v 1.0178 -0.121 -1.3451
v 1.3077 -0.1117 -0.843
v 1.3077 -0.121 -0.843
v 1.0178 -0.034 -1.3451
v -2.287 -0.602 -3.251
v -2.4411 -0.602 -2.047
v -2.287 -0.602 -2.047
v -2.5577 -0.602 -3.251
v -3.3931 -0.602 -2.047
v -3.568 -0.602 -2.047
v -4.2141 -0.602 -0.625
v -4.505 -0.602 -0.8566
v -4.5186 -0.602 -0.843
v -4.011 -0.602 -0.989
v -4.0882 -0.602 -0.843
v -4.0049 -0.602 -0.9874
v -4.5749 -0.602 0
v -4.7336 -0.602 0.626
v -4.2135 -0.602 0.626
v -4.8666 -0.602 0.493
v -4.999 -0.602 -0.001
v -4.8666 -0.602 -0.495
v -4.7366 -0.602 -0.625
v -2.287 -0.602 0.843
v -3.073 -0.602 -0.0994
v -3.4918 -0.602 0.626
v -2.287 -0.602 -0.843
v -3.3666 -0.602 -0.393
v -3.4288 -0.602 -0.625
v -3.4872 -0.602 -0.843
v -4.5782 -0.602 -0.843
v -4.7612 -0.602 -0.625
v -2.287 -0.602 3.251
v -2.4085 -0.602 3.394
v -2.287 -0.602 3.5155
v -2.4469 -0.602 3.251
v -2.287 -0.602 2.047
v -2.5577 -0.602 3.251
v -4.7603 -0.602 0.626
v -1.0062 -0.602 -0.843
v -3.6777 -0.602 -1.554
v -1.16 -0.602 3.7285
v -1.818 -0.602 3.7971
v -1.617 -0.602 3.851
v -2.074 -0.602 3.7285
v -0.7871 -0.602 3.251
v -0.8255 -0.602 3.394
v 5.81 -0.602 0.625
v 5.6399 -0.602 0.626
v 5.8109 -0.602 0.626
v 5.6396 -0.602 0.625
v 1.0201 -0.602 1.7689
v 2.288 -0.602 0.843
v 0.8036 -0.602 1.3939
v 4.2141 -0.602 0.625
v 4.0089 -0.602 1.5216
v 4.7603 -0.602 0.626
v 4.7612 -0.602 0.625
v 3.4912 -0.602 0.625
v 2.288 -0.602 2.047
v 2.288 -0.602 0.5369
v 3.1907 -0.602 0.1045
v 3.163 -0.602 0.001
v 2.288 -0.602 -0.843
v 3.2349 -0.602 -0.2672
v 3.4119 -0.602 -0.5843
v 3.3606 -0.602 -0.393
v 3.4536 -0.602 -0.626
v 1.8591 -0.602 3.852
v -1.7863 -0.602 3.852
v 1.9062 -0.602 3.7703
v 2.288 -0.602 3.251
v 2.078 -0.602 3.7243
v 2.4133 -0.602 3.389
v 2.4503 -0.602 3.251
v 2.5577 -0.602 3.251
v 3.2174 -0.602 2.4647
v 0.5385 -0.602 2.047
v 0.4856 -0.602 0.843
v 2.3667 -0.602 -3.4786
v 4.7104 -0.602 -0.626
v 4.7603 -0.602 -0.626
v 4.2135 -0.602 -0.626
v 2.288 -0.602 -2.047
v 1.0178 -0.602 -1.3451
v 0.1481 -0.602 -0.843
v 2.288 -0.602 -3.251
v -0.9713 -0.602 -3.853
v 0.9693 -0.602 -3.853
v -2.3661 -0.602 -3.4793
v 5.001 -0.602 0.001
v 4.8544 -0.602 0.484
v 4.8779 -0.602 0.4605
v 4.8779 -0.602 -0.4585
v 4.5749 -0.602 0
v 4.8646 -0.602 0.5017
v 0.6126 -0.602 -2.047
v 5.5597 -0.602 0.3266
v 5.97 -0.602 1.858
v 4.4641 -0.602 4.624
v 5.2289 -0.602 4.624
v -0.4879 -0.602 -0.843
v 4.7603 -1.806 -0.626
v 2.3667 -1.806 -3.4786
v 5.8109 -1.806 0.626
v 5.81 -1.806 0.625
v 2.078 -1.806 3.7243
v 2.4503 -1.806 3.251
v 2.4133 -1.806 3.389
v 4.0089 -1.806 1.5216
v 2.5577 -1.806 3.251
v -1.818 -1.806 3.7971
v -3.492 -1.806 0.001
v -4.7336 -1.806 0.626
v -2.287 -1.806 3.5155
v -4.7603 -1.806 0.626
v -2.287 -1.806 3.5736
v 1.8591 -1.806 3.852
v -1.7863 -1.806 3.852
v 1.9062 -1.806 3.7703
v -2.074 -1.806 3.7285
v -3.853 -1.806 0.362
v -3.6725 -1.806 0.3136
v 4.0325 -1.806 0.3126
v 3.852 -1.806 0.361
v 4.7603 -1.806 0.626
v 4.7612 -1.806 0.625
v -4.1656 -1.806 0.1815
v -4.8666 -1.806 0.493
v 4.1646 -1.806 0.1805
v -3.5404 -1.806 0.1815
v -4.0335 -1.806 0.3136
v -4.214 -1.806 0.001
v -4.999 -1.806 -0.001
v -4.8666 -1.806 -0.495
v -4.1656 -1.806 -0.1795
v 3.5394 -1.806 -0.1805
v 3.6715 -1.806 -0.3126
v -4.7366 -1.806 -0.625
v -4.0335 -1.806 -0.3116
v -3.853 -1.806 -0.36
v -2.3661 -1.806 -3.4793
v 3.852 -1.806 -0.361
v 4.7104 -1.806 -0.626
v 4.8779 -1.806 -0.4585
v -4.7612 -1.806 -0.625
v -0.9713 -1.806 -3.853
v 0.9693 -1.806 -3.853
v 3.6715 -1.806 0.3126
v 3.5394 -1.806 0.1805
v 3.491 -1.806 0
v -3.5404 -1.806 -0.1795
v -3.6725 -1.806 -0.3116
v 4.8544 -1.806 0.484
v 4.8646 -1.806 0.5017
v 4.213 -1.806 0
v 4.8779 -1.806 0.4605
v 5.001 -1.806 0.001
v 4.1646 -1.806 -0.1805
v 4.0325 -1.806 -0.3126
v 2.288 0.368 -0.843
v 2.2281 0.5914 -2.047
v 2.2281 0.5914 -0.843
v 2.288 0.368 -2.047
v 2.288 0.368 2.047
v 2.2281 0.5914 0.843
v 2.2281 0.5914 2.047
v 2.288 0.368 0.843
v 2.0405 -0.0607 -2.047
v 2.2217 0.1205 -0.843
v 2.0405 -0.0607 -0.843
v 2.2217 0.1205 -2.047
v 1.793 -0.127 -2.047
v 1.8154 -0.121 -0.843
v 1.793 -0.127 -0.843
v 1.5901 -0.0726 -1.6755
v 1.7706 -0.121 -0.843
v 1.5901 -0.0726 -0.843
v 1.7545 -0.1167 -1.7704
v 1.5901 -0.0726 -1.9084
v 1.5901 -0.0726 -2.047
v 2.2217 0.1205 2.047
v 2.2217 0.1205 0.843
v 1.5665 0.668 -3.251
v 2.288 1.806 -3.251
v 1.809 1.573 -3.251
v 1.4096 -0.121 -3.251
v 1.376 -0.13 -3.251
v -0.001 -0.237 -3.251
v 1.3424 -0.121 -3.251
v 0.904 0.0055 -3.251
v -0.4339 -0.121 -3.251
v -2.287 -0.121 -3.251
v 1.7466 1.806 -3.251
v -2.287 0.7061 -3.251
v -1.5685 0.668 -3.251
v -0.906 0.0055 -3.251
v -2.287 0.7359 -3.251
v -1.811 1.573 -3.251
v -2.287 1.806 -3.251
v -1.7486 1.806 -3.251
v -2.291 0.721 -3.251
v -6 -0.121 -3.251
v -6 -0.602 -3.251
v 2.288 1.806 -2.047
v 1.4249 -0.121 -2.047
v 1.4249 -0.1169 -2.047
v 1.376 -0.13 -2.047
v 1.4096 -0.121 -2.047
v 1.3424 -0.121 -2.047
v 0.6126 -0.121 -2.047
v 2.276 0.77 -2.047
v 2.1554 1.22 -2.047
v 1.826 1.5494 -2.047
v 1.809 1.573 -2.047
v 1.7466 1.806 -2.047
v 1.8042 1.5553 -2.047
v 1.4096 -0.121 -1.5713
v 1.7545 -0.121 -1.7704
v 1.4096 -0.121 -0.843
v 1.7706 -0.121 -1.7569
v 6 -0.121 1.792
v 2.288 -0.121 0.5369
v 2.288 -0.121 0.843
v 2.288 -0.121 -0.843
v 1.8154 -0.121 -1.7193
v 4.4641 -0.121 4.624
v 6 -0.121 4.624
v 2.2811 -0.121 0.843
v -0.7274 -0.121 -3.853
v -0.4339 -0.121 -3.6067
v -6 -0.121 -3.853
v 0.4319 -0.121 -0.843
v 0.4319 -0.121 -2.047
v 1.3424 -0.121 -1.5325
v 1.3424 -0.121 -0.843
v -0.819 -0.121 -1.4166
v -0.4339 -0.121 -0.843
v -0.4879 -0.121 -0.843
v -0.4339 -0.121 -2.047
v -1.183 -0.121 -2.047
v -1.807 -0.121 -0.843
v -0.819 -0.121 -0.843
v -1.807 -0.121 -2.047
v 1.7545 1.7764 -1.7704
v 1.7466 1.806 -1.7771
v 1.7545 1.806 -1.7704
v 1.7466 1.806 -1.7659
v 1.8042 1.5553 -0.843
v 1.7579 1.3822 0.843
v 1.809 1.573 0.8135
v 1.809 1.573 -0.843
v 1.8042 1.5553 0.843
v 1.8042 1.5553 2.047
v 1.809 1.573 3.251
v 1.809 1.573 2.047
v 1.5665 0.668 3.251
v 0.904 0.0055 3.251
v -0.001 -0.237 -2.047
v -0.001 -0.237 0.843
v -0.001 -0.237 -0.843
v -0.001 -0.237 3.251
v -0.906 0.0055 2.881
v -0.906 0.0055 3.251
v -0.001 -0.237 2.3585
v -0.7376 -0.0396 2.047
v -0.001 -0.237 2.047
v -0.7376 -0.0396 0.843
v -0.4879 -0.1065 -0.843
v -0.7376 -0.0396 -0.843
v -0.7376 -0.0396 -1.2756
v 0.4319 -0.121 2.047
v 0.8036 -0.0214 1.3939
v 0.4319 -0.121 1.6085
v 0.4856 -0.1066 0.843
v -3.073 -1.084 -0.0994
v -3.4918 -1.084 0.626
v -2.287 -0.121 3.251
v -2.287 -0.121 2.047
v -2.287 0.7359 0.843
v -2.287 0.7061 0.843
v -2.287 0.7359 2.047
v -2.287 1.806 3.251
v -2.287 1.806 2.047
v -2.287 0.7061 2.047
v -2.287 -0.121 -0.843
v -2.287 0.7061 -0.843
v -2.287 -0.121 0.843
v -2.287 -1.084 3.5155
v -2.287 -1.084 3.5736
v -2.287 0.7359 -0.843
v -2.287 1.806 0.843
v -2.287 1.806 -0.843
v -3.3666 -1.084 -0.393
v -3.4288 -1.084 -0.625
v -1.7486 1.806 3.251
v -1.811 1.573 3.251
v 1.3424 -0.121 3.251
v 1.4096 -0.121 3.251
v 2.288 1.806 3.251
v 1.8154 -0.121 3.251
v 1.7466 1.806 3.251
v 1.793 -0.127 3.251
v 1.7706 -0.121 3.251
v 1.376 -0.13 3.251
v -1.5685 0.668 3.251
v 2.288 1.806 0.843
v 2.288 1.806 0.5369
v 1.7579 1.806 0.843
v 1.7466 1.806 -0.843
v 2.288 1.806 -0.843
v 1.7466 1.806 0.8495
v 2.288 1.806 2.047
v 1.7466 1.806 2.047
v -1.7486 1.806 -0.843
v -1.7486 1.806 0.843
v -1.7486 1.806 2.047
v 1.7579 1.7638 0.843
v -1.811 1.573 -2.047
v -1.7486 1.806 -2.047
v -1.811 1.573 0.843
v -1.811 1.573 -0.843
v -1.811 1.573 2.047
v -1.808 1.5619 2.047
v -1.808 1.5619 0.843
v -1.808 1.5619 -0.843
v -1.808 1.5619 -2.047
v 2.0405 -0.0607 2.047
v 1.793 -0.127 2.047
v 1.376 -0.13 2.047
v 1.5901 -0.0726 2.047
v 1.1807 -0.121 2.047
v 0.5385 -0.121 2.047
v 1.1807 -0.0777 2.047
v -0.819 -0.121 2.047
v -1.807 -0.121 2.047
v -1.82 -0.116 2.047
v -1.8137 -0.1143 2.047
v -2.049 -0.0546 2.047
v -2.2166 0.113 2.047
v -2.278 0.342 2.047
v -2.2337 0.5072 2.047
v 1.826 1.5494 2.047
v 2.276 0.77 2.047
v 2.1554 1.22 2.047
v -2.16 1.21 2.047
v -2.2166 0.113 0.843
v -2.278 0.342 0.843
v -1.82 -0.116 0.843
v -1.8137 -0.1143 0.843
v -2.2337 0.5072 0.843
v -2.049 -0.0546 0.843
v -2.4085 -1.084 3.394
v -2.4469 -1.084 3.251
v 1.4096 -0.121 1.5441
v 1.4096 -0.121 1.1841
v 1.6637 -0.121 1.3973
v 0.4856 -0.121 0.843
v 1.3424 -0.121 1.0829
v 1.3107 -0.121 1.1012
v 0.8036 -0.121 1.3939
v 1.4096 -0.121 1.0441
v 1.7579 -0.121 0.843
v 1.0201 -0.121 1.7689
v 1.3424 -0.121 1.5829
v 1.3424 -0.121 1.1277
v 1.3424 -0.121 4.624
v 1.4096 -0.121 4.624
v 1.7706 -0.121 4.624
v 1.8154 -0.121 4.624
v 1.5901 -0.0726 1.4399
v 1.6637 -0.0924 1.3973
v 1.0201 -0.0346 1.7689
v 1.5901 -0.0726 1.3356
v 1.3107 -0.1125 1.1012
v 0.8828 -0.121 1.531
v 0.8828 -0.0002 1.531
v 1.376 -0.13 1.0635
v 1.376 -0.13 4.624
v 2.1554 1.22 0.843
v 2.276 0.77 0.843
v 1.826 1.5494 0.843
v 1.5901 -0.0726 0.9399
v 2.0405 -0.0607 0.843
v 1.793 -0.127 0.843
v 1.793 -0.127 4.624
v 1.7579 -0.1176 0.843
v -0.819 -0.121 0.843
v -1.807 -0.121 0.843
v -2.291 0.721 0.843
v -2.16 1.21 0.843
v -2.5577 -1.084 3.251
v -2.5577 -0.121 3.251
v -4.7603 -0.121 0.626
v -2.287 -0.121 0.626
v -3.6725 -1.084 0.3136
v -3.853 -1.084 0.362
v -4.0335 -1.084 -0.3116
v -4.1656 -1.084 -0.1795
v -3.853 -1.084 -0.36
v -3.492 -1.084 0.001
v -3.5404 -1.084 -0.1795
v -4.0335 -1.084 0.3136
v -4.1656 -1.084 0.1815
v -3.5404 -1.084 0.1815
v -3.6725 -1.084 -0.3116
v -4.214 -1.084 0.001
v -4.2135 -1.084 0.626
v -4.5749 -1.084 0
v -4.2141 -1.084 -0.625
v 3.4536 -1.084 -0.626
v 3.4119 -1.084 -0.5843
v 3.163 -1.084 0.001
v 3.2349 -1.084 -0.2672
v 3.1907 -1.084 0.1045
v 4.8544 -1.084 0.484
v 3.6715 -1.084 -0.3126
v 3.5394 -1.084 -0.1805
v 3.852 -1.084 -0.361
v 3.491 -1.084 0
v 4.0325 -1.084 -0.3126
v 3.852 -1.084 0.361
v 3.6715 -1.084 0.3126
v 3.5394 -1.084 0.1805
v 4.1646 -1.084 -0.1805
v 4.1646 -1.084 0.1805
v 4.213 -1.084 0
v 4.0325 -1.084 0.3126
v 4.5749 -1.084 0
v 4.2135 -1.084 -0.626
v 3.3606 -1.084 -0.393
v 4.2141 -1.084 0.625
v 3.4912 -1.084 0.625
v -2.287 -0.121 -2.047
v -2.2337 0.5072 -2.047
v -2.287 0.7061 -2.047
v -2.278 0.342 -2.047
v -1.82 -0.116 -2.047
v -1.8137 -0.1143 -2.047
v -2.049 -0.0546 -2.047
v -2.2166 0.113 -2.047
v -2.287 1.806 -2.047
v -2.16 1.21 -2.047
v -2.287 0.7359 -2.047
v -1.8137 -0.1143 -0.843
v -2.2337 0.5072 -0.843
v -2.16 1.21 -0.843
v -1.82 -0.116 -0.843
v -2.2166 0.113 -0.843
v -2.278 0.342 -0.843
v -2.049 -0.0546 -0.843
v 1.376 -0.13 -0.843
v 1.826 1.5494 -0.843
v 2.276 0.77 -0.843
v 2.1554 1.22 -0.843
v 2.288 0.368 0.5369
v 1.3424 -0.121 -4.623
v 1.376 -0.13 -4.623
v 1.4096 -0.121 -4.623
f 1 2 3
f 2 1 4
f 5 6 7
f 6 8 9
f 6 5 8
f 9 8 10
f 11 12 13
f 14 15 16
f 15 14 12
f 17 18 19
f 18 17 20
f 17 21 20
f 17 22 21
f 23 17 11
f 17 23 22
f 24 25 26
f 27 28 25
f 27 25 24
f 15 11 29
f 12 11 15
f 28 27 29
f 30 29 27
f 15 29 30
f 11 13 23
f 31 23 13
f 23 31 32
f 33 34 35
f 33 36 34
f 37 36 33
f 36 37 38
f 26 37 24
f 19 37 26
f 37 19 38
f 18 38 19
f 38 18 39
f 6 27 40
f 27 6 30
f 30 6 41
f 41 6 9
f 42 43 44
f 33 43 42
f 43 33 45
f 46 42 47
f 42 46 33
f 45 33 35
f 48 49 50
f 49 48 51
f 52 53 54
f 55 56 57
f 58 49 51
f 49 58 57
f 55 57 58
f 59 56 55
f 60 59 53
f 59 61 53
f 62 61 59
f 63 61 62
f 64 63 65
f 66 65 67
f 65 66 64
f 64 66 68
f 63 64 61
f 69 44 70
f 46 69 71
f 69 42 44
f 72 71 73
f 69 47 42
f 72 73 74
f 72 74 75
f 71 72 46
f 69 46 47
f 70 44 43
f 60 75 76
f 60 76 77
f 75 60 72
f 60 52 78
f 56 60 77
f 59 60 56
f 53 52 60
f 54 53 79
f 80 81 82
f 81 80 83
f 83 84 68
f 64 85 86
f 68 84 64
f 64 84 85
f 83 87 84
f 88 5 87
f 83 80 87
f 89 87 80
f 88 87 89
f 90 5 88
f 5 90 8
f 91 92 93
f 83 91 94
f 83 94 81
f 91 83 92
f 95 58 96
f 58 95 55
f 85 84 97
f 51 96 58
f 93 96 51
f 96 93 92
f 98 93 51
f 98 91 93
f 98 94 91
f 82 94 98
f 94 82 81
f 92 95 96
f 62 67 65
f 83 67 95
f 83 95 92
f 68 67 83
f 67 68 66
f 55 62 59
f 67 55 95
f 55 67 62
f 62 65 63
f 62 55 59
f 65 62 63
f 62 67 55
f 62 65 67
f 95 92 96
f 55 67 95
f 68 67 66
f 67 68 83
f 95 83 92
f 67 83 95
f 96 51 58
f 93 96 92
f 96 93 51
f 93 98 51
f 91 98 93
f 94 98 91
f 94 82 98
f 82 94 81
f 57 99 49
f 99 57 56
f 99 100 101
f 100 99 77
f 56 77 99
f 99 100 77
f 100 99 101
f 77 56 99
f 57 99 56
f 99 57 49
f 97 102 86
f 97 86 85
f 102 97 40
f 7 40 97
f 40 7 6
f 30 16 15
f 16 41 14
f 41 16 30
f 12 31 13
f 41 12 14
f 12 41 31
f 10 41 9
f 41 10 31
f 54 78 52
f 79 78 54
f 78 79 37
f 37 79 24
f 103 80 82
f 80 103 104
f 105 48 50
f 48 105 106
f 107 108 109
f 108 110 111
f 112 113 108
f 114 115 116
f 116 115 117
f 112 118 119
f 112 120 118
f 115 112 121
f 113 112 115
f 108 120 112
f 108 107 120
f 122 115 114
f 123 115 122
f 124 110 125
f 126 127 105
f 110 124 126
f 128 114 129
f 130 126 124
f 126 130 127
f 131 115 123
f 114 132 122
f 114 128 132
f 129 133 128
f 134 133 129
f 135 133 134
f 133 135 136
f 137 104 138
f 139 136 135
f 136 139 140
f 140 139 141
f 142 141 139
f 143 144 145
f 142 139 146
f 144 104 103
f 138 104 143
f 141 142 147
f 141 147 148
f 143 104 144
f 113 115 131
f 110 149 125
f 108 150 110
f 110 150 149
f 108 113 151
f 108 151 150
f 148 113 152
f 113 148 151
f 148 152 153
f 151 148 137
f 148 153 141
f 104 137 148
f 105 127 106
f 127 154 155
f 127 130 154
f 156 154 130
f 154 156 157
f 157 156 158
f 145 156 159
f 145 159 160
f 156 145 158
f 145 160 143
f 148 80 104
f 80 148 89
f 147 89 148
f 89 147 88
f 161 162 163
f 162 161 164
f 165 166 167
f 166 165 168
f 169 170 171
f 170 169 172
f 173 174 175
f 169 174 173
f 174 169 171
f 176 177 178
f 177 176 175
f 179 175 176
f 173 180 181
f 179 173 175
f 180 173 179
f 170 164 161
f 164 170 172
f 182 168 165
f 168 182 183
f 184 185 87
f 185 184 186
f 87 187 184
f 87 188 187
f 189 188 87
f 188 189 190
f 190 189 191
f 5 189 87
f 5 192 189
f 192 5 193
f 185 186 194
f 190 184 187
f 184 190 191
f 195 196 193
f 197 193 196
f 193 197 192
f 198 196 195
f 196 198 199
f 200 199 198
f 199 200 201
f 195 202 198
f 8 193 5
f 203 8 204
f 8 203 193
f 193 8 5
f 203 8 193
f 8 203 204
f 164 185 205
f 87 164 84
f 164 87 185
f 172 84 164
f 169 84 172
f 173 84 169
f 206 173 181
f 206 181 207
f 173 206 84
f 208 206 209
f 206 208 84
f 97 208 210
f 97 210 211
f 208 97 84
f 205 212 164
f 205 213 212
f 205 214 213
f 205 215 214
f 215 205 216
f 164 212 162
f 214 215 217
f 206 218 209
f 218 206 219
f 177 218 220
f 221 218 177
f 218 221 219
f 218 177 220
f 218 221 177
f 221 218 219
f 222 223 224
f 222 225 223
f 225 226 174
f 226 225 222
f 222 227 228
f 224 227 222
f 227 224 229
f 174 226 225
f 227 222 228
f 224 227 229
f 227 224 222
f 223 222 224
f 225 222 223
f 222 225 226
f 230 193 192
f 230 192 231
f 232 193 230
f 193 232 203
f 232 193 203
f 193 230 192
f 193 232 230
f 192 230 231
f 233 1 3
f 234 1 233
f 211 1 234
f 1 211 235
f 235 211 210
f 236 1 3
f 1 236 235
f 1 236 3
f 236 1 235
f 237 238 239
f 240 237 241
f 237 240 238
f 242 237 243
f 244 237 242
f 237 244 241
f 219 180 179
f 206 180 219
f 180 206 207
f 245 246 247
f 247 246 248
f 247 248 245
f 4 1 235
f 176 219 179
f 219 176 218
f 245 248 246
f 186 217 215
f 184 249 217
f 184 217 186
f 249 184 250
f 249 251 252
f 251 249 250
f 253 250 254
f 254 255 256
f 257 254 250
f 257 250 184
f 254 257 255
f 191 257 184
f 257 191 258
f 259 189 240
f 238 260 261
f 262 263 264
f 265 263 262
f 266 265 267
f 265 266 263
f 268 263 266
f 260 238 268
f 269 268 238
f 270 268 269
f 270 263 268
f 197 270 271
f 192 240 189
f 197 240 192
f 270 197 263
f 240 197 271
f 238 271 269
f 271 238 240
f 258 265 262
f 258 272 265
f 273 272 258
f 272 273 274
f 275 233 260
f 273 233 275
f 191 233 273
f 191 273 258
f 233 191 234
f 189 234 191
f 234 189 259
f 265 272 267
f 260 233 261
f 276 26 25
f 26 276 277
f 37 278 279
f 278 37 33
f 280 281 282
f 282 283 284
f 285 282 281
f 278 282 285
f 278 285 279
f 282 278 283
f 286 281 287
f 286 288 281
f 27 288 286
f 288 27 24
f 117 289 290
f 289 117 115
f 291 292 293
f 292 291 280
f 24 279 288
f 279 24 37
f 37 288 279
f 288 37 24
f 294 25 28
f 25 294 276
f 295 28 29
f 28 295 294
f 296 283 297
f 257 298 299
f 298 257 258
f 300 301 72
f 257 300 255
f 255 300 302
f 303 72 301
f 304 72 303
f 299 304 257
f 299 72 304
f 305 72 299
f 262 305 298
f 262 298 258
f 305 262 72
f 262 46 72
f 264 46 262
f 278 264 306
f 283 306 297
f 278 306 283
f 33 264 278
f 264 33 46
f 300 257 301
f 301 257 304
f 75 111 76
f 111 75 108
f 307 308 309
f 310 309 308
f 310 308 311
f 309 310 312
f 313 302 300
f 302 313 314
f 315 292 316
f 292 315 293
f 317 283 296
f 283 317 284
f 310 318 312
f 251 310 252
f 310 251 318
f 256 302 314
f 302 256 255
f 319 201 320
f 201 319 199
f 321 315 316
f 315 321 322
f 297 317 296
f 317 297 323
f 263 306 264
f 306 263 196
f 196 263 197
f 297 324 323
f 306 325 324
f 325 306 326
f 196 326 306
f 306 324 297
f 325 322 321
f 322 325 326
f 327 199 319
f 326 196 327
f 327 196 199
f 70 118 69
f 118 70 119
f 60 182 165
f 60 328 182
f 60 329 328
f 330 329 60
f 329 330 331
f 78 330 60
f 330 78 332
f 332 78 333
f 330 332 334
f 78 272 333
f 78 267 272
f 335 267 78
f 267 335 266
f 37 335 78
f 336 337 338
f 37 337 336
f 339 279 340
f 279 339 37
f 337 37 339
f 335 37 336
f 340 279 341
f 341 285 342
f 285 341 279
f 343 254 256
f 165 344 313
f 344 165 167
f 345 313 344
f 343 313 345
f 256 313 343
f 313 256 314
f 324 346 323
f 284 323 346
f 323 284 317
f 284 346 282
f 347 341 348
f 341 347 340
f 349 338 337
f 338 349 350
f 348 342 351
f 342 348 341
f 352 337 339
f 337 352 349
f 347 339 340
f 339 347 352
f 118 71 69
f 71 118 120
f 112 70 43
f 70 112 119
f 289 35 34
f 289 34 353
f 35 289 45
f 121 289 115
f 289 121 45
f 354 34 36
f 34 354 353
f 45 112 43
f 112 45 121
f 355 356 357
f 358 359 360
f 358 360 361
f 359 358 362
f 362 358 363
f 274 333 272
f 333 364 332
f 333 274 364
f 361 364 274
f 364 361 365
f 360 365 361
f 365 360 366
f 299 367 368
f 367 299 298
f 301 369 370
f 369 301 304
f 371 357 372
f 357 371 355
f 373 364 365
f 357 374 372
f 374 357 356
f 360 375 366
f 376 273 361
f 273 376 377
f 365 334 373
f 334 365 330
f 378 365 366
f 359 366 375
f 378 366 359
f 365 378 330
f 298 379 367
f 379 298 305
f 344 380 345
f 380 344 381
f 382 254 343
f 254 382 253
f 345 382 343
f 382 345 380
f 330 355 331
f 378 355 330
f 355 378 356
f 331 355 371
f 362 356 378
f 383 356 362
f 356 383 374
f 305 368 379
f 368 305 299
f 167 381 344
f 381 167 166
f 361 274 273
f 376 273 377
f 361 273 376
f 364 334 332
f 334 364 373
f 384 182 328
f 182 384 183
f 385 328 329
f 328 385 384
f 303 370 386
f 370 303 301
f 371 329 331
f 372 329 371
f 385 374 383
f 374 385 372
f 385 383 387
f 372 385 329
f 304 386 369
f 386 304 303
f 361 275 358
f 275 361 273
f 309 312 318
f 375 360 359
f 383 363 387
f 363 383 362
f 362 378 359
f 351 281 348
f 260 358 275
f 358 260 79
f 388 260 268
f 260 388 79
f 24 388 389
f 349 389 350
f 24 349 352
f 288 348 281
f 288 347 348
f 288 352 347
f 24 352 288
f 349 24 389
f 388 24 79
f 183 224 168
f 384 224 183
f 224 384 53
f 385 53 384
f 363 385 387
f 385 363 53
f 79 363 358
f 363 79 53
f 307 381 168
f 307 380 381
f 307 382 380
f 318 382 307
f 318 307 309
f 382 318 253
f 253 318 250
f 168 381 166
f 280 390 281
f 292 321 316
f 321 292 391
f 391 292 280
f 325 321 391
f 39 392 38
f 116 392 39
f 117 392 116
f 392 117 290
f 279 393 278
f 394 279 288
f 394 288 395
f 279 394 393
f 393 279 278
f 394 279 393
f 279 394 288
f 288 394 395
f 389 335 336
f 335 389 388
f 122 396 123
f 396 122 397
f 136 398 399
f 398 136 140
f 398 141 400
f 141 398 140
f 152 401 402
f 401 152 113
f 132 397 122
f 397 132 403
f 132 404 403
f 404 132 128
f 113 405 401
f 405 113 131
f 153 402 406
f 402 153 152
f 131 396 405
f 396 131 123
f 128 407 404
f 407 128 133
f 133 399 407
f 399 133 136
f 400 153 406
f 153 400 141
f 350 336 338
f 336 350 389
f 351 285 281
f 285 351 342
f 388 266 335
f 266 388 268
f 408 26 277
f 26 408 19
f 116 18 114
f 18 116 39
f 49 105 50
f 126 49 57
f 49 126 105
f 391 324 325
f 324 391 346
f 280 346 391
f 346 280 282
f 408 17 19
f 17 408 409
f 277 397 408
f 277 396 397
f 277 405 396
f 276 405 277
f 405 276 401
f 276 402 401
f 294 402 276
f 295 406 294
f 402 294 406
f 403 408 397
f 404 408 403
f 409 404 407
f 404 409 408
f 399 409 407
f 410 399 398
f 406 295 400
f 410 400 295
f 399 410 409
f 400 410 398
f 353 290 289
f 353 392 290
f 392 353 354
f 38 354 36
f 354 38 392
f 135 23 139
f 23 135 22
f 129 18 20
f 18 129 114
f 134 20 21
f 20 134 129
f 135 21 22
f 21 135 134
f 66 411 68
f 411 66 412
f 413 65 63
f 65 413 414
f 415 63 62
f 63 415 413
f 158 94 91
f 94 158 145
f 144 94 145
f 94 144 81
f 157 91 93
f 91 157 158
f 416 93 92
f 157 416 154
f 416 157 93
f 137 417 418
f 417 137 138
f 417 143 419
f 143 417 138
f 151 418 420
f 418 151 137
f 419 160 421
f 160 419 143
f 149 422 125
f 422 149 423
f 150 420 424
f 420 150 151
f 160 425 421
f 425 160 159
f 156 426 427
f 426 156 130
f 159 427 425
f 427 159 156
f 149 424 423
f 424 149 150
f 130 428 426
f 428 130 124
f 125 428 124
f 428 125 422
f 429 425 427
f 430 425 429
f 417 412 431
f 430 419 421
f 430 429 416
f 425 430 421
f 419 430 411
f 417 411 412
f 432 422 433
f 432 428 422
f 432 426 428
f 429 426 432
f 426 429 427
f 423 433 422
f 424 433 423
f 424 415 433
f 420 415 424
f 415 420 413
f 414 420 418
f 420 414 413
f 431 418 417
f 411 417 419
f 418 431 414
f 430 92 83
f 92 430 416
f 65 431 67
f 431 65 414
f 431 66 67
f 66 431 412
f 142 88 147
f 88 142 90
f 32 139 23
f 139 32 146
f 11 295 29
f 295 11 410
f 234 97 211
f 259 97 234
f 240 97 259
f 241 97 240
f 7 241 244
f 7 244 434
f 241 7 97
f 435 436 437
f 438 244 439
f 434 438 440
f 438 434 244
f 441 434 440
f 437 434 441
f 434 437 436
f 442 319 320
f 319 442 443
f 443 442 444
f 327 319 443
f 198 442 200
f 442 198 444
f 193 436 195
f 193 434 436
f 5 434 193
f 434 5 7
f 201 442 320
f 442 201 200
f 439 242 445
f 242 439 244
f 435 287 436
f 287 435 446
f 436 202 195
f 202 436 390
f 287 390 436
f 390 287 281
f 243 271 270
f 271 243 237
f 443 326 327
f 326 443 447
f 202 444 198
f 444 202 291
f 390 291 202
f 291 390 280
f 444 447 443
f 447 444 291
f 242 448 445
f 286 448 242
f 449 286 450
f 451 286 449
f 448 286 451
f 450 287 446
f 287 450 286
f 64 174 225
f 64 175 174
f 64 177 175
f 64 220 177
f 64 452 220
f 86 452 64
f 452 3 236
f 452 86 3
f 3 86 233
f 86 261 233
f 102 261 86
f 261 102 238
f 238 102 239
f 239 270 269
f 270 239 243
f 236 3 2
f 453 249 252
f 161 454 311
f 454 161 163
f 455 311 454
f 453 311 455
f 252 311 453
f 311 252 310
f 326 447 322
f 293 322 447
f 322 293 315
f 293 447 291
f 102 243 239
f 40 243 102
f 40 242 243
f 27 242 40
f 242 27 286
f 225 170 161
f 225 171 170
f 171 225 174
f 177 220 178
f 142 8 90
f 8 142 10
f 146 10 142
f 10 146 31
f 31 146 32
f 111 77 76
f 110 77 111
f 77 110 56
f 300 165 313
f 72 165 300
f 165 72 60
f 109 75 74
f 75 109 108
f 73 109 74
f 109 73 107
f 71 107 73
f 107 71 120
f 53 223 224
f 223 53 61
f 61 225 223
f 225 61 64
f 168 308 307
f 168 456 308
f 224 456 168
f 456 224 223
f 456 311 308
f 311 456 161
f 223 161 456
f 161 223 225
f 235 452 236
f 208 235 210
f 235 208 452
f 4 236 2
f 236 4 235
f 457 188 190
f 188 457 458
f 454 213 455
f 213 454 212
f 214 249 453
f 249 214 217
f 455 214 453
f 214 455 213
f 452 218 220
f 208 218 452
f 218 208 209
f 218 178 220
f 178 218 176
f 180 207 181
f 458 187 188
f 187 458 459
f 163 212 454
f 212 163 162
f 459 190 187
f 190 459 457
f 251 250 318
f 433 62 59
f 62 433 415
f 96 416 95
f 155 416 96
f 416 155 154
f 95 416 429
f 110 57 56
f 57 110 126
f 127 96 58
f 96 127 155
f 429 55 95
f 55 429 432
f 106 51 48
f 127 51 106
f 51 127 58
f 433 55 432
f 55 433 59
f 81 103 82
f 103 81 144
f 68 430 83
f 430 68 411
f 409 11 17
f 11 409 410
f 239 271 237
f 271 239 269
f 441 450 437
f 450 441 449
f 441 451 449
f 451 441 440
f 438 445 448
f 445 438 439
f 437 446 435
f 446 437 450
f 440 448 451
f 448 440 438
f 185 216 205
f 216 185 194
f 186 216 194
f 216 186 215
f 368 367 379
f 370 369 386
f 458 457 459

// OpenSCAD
intersection() {
union() {
intersection() {
union() {
rotate([0, 0, 0])
translate([-0.001, 1.573, -2.047])
cylinder(h = 20.147, r1 = 1.81, r2 = 1.81, center = false, $fn = 12);
rotate([90, 30, 0])
translate([1.554, -18.1, -18.1]) cube(size = [16.546, 36.2, 18.221], center = false);
}
union() {
rotate([180, 90, -90])
translate([0.001, 4.011, -18.1])
cylinder(h = 16.294, r1 = 0.988, r2 = 0.988, center = false, $fn = 12);
rotate([0, 0, 0])
translate([-1.82, 0.342, -18.1])
cylinder(h = 14.247, r1 = 0.458, r2 = 0.458, center = false, $fn = 12);
}
}
intersection() {
union() {
rotate([0, 0, 0])
translate([1.793, 0.368, -3.251])
cylinder(h = 21.351, r1 = 0.495, r2 = 0.495, center = false, $fn = 12);
intersection() {
difference() {
rotate([90, 30, 0])
translate([1.554, -18.1, 0.602]) cube(size = [16.546, 36.2, 17.498], center = false);
rotate([90, 40, 0])
translate([4.049, -18.1, -1.806]) cube(size = [14.051, 36.2, 3.612], center = false);
}
rotate([180, 90, -90])
translate([-1.858, 0.001, -18.1])
cylinder(h = 36.2, r1 = 5.971, r2 = 5.971, center = false, $fn = 12);
translate([-18.1, -1.806, -3.853]) cube(size = [36.2, 1.204, 21.953], center = false);
}
translate([-18.1, -0.602, -3.251]) cube(size = [20.388, 0.481, 1.204], center = false);
rotate([-90, -40, 0])
translate([-18.1, -18.1, -0.121]) cube(size = [36.2, 20.584, 18.221], center = false);
rotate([0, 0, 0])
translate([1.793, 0.368, -3.251])
cylinder(h = 1.204, r1 = 0.495, r2 = 0.495, center = false, $fn = 12);
}
union() {
intersection() {
difference() {
rotate([90, 30, 0])
translate([1.554, -18.1, -1.806]) cube(size = [16.546, 36.2, 3.612], center = false);
translate([-18.1, -0.602, -3.251]) cube(size = [20.388, 0.481, 21.351], center = false);
}
difference() {
rotate([90, 30, 0])
translate([1.554, -18.1, -1.806]) cube(size = [16.546, 17.444, 19.906], center = false);
rotate([0, 0, 0])
translate([-0.001, 1.573, -18.1])
cylinder(h = 36.2, r1 = 1.81, r2 = 1.81, center = false, $fn = 12);
}
}
difference() {
union() {
translate([-18.1, -0.602, -3.853]) cube(size = [36.2, 0.481, 0.602], center = false);
rotate([90, 30, 0])
translate([1.554, -18.1, 0.121]) cube(size = [16.546, 36.2, 0.481], center = false);
}
union() {
rotate([0, 0, 0])
translate([-0.001, 1.573, -3.853])
cylinder(h = 1.806, r1 = 1.81, r2 = 1.81, center = false, $fn = 12);
rotate([180, 0, 180])
translate([-1.376, 0.77, -18.1])
cylinder(h = 20.147, r1 = 0.9, r2 = 0.9, center = false, $fn = 12);
}
}
}
}
difference() {
union() {
difference() {
rotate([-90, -30, 0])
translate([-2.711, -18.1, -1.806]) cube(size = [6.247, 36.2, 1.204], center = false);
translate([-2.287, -1.806, -18.1]) cube(size = [20.387, 1.204, 36.2], center = false);
}
difference() {
union() {
rotate([180, 90, -90])
translate([2.335, 0.003, -1.806])
cylinder(h = 1.204, r1 = 3.884, r2 = 3.884, center = false, $fn = 12);
translate([-2.287, -1.806, -0.626]) cube(size = [20.387, 3.612, 3.877], center = false);
}
union() {
rotate([-90, -40, 0])
translate([-18.1, -0.001, -1.806]) cube(size = [36.2, 18.101, 3.612], center = false);
rotate([0, 0, 0])
translate([-0.001, 1.573, -0.626])
cylinder(h = 3.877, r1 = 1.81, r2 = 1.81, center = false, $fn = 12);
}
}
difference() {
translate([-2.287, -1.806, 2.047]) cube(size = [20.387, 1.204, 1.805], center = false);
rotate([180, 90, -90])
translate([-2.937, 1.617, -0.602])
cylinder(h = 0.481, r1 = 0.914, r2 = 0.914, center = false, $fn = 12);
}
}
union() {
difference() {
translate([-2.287, -0.602, 0.626]) cube(size = [20.387, 2.408, 1.421], center = false);
rotate([0, 0, 0])
translate([-1.82, 0.342, 0.626])
cylinder(h = 1.421, r1 = 0.458, r2 = 0.458, center = false, $fn = 12);
}
difference() {
union() {
translate([-18.1, -18.1, -18.1]) cube(size = [36.2, 17.979, 21.952], center = false);
translate([-18.1, -0.121, 2.047]) cube(size = [36.2, 1.927, 1.204], center = false);
}
intersection() {
rotate([90, 30, 0])
translate([-18.1, -18.1, -1.806]) cube(size = [18.099, 36.2, 3.612], center = false);
rotate([-90, -30, 0])
translate([-3.962, -18.1, -18.1]) cube(size = [7.498, 36.2, 19.906], center = false);
}
}
difference() {
rotate([90, 30, 0])
translate([-18.1, -18.1, 0.602]) cube(size = [14.627, 36.2, 17.498], center = false);
rotate([180, 90, -90])
translate([-2.937, 1.617, -1.806])
cylinder(h = 1.204, r1 = 0.914, r2 = 0.914, center = false, $fn = 12);
}
}
}
difference() {
union() {
rotate([180, 0, 180])
translate([-1.376, 0.77, -18.1])
cylinder(h = 18.943, r1 = 0.9, r2 = 0.9, center = false, $fn = 12);
rotate([90, 30, 0])
translate([-18.1, 1.609, -1.806]) cube(size = [18.099, 16.491, 1.927], center = false);
rotate([0, 0, 0])
translate([1.793, 0.368, -18.1])
cylinder(h = 36.2, r1 = 0.495, r2 = 0.495, center = false, $fn = 12);
rotate([90, 30, 0])
translate([-0.001, -18.1, -1.806]) cube(size = [18.101, 19.709, 1.927], center = false);
difference() {
union() {
rotate([0, 0, 0])
translate([-0.001, 1.573, 0.843])
cylinder(h = 17.257, r1 = 1.81, r2 = 1.81, center = false, $fn = 12);
rotate([90, 30, 0])
translate([-18.1, -18.1, -1.806]) cube(size = [36.2, 20.142, 1.927], center = false);
}
union() {
rotate([-90, -40, 0])
translate([-18.1, -0.001, -1.806]) cube(size = [22.149, 2.485, 19.906], center = false);
rotate([90, 30, 0])
translate([-18.1, -18.1, -18.1]) cube(size = [18.099, 20.142, 18.702], center = false);
}
}
}
union() {
rotate([90, 30, 0])
translate([-18.1, -18.1, 0.121]) cube(size = [36.2, 19.709, 1.685], center = false);
translate([-18.1, -0.121, -18.1]) cube(size = [36.2, 1.927, 18.943], center = false);
rotate([0, 0, 0])
translate([-0.001, 1.573, -18.1])
cylinder(h = 36.2, r1 = 1.81, r2 = 1.81, center = false, $fn = 12);
translate([-18.1, -0.121, 2.047]) cube(size = [36.2, 1.927, 16.053], center = false);
}
}
intersection() {
union() {
difference() {
rotate([90, 40, 0])
translate([-4.049, -18.1, 0.121]) cube(size = [22.149, 36.2, 17.979], center = false);
rotate([180, 90, -90])
translate([-0.001, 3.853, -1.806])
cylinder(h = 19.906, r1 = 0.361, r2 = 0.361, center = false, $fn = 12);
}
intersection() {
translate([-1.313, 0.721, 0.626])
cylinder(h = 2.625, r1 = 0.978, r2 = 0.978, center = false, $fn = 12);
translate([-2.287, -1.084, -0.626]) cube(size = [20.387, 2.89, 3.877], center = false);
}
}
difference() {
difference() {
translate([-18.1, -18.1, -18.1]) cube(size = [36.2, 36.2, 21.952], center = false);
rotate([0, 0, 0])
translate([-0.001, 1.573, 0.626])
cylinder(h = 2.625, r1 = 1.81, r2 = 1.81, center = false, $fn = 12);
}
difference() {
rotate([90, 30, 0])
translate([-3.962, -18.1, 0.121]) cube(size = [22.062, 36.2, 0.963], center = false);
translate([-18.1, -1.084, 0.626]) cube(size = [15.813, 0.963, 2.625], center = false);
}
}
union() {
translate([-2.287, -1.084, 0.626]) cube(size = [20.387, 2.89, 3.227], center = false);
intersection() {
union() {
rotate([180, 90, -90])
translate([0.001, 4.011, -1.806])
cylinder(h = 1.204, r1 = 0.988, r2 = 0.988, center = false, $fn = 12);
translate([-18.1, -1.806, 0.626]) cube(size = [15.813, 3.612, 3.227], center = false);
}
union() {
rotate([-90, -30, 0])
translate([-18.1, -18.1, -18.1]) cube(size = [21.636, 36.2, 17.498], center = false);
rotate([90, 30, 0])
translate([-18.1, -18.1, -1.806]) cube(size = [18.099, 36.2, 1.927], center = false);
}
}
}
}
difference() {
difference() {
rotate([180, 90, -90])
translate([-0.001, -4.082, -1.806])
cylinder(h = 1.204, r1 = 0.919, r2 = 0.919, center = false, $fn = 12);
rotate([180, 90, -90])
translate([0, -3.852, -1.806])
cylinder(h = 19.906, r1 = 0.361, r2 = 0.361, center = false, $fn = 12);
}
difference() {
rotate([90, 30, 0])
translate([-18.1, -18.1, -18.1]) cube(size = [22.062, 36.2, 19.184], center = false);
rotate([180, 90, -90])
translate([2.335, 0.003, -1.084])
cylinder(h = 19.184, r1 = 3.884, r2 = 3.884, center = false, $fn = 12);
}
}
difference() {
union() {
translate([-2.287, -1.806, -3.251]) cube(size = [20.387, 3.612, 1.204], center = false);
translate([-1.313, 0.721, -3.251])
cylinder(h = 4.094, r1 = 0.978, r2 = 0.978, center = false, $fn = 12);
intersection() {
rotate([180, 90, -90])
translate([-1.858, 0.001, -1.806])
cylinder(h = 1.685, r1 = 5.971, r2 = 5.971, center = false, $fn = 12);
translate([-18.1, -18.1, -3.853]) cube(size = [36.2, 17.498, 3.228], center = false);
}
translate([-2.287, -1.806, -0.843]) cube(size = [20.387, 3.612, 1.686], center = false);
}
union() {
rotate([0, 0, 0])
translate([-0.001, 1.573, -18.1])
cylinder(h = 36.2, r1 = 1.81, r2 = 1.81, center = false, $fn = 12);
translate([-18.1, -0.602, -2.047]) cube(size = [36.2, 0.481, 1.204], center = false);
rotate([90, 30, 0])
translate([1.554, -18.1, -18.1]) cube(size = [16.546, 36.2, 36.2], center = false);
rotate([-90, -40, 0])
translate([-18.1, -18.1, -1.806]) cube(size = [14.051, 36.2, 1.685], center = false);
}
}
difference() {
union() {
rotate([180, 90, -90])
translate([-2.931, -1.62, -1.806])
cylinder(h = 1.204, r1 = 0.916, r2 = 0.916, center = false, $fn = 12);
intersection() {
difference() {
rotate([-90, -40, 0])
translate([-18.1, -18.1, -1.806]) cube(size = [22.149, 20.584, 3.612], center = false);
rotate([90, 30, 0])
translate([-18.1, 1.609, -1.806]) cube(size = [18.099, 0.433, 2.408], center = false);
}
union() {
translate([-18.1, -0.602, 2.047]) cube(size = [20.388, 18.702, 1.204], center = false);
translate([-18.1, -18.1, -0.843]) cube(size = [36.2, 17.498, 4.094], center = false);
}
}
translate([-18.1, -0.602, -0.843]) cube(size = [20.388, 0.481, 1.686], center = false);
translate([-18.1, -0.121, -0.843]) cube(size = [20.388, 1.927, 1.686], center = false);
rotate([180, 0, 180])
translate([-1.376, 0.77, 0.843])
cylinder(h = 17.257, r1 = 0.9, r2 = 0.9, center = false, $fn = 12);
}
intersection() {
union() {
rotate([0, 0, 0])
translate([-0.001, 1.573, -18.1])
cylinder(h = 36.2, r1 = 1.81, r2 = 1.81, center = false, $fn = 12);
rotate([-90, -40, 0])
translate([-18.1, 2.484, -0.121]) cube(size = [22.149, 15.616, 18.221], center = false);
rotate([90, 30, 0])
translate([-18.1, -18.1, -1.806]) cube(size = [18.099, 19.709, 3.612], center = false);
translate([2.288, -1.806, -18.1]) cube(size = [15.812, 19.906, 18.943], center = false);
}
union() {
difference() {
translate([-18.1, -1.806, -18.1]) cube(size = [20.388, 3.612, 21.351], center = false);
rotate([90, 30, 0])
translate([-0.001, 1.609, -18.1]) cube(size = [18.101, 0.433, 36.2], center = false);
}
rotate([-90, -40, 0])
translate([-18.1, 2.484, -1.806]) cube(size = [22.149, 15.616, 3.612], center = false);
rotate([180, 90, -90])
translate([-0.001, -4.082, -1.806])
cylinder(h = 19.906, r1 = 0.919, r2 = 0.919, center = false, $fn = 12);
}
}
}
difference() {
intersection() {
translate([-18.1, -18.1, -18.1]) cube(size = [36.2, 17.498, 18.726], center = false);
rotate([90, 30, 0])
translate([-18.1, -0.656, -18.1]) cube(size = [20.811, 18.756, 19.906], center = false);
}
difference() {
rotate([90, 30, 0])
translate([2.711, -18.1, 0.602]) cube(size = [1.251, 36.2, 1.204], center = false);
translate([-18.1, -18.1, -18.1]) cube(size = [36.2, 17.498, 17.474], center = false);
}
}
difference() {
intersection() {
rotate([90, 30, 0])
translate([2.711, -0.656, 0.602]) cube(size = [1.251, 18.756, 17.498], center = false);
rotate([-90, -40, 0])
translate([-18.1, -18.1, -1.806]) cube(size = [22.149, 36.2, 19.906], center = false);
}
intersection() {
rotate([180, 90, -90])
translate([-0.001, -4.082, -1.806])
cylinder(h = 19.906, r1 = 0.919, r2 = 0.919, center = false, $fn = 12);
rotate([-90, -30, 0])
translate([-18.1, -18.1, -1.806]) cube(size = [22.062, 36.2, 19.906], center = false);
}
}
difference() {
rotate([90, 30, 0])
translate([2.711, -0.656, 0.602]) cube(size = [15.389, 18.756, 1.204], center = false);
intersection() {
union() {
translate([-18.1, -1.806, -0.626]) cube(size = [36.2, 0.722, 1.251], center = false);
translate([-18.1, -1.084, -0.626]) cube(size = [36.2, 19.184, 1.251], center = false);
rotate([90, 40, 0])
translate([4.049, -18.1, -18.1]) cube(size = [14.051, 36.2, 36.2], center = false);
translate([-18.1, -18.1, 0.626]) cube(size = [36.2, 36.2, 17.474], center = false);
}
union() {
translate([0, 0, 0]) sphere(r = 54.3, $fn = 12);
rotate([180, 90, -90])
translate([-0.001, -4.082, -0.602])
cylinder(h = 18.702, r1 = 0.919, r2 = 0.919, center = false, $fn = 12);
}
}
}
intersection() {
difference() {
translate([-18.1, -1.084, 0.626]) cube(size = [36.2, 0.482, 17.474], center = false);
rotate([90, 30, 0])
translate([-18.1, -18.1, -18.1]) cube(size = [36.2, 17.444, 19.184], center = false);
}
rotate([180, 90, -90])
translate([-0.001, -4.082, -1.806])
cylinder(h = 19.906, r1 = 0.919, r2 = 0.919, center = false, $fn = 12);
}
intersection() {
rotate([-90, -30, 0])
translate([-18.1, -18.1, -18.1]) cube(size = [14.138, 36.2, 36.2], center = false);
translate([-18.1, -1.806, -2.047]) cube(size = [15.813, 1.204, 2.89], center = false);
rotate([180, 90, -90])
translate([0.001, 4.011, -1.806])
cylinder(h = 1.204, r1 = 0.988, r2 = 0.988, center = false, $fn = 12);
translate([-18.1, -18.1, -2.047]) cube(size = [36.2, 36.2, 2.89], center = false);
}
intersection() {
rotate([90, 30, 0])
translate([-18.1, -18.1, -1.806]) cube(size = [19.654, 36.2, 19.906], center = false);
union() {
rotate([90, 30, 0])
translate([-0.001, -18.1, -18.1]) cube(size = [1.556, 36.2, 18.221], center = false);
rotate([0, 0, 0])
translate([-1.82, 0.342, -2.047])
cylinder(h = 1.204, r1 = 0.458, r2 = 0.458, center = false, $fn = 12);
}
difference() {
difference() {
translate([-2.287, -0.121, -2.047]) cube(size = [20.387, 1.927, 1.204], center = false);
rotate([0, 0, 0])
translate([-0.001, 1.573, -2.047])
cylinder(h = 1.421, r1 = 1.81, r2 = 1.81, center = false, $fn = 12);
}
rotate([90, 30, 0])
translate([-18.1, -18.1, -18.1]) cube(size = [18.099, 36.2, 16.294], center = false);
}
}
difference() {
union() {
rotate([180, 0, 180])
translate([-1.376, 0.77, -18.1])
cylinder(h = 21.351, r1 = 0.9, r2 = 0.9, center = false, $fn = 12);
translate([-18.1, -0.121, -3.251]) cube(size = [20.388, 1.927, 1.204], center = false);
rotate([0, 0, 0])
translate([1.793, 0.368, -2.047])
cylinder(h = 20.147, r1 = 0.495, r2 = 0.495, center = false, $fn = 12);
}
union() {
rotate([0, 0, 0])
translate([-0.001, 1.573, -18.1])
cylinder(h = 36.2, r1 = 1.81, r2 = 1.81, center = false, $fn = 12);
rotate([90, 30, 0])
translate([-18.1, -18.1, -18.1]) cube(size = [19.654, 36.2, 18.702], center = false);
rotate([90, 40, 0])
translate([-18.1, -18.1, 0.121]) cube(size = [36.2, 36.2, 17.979], center = false);
}
}
}
translate([-6, -2.167, -4.623]) cube(size = [12, 4.334, 9.247], center = false);
}
